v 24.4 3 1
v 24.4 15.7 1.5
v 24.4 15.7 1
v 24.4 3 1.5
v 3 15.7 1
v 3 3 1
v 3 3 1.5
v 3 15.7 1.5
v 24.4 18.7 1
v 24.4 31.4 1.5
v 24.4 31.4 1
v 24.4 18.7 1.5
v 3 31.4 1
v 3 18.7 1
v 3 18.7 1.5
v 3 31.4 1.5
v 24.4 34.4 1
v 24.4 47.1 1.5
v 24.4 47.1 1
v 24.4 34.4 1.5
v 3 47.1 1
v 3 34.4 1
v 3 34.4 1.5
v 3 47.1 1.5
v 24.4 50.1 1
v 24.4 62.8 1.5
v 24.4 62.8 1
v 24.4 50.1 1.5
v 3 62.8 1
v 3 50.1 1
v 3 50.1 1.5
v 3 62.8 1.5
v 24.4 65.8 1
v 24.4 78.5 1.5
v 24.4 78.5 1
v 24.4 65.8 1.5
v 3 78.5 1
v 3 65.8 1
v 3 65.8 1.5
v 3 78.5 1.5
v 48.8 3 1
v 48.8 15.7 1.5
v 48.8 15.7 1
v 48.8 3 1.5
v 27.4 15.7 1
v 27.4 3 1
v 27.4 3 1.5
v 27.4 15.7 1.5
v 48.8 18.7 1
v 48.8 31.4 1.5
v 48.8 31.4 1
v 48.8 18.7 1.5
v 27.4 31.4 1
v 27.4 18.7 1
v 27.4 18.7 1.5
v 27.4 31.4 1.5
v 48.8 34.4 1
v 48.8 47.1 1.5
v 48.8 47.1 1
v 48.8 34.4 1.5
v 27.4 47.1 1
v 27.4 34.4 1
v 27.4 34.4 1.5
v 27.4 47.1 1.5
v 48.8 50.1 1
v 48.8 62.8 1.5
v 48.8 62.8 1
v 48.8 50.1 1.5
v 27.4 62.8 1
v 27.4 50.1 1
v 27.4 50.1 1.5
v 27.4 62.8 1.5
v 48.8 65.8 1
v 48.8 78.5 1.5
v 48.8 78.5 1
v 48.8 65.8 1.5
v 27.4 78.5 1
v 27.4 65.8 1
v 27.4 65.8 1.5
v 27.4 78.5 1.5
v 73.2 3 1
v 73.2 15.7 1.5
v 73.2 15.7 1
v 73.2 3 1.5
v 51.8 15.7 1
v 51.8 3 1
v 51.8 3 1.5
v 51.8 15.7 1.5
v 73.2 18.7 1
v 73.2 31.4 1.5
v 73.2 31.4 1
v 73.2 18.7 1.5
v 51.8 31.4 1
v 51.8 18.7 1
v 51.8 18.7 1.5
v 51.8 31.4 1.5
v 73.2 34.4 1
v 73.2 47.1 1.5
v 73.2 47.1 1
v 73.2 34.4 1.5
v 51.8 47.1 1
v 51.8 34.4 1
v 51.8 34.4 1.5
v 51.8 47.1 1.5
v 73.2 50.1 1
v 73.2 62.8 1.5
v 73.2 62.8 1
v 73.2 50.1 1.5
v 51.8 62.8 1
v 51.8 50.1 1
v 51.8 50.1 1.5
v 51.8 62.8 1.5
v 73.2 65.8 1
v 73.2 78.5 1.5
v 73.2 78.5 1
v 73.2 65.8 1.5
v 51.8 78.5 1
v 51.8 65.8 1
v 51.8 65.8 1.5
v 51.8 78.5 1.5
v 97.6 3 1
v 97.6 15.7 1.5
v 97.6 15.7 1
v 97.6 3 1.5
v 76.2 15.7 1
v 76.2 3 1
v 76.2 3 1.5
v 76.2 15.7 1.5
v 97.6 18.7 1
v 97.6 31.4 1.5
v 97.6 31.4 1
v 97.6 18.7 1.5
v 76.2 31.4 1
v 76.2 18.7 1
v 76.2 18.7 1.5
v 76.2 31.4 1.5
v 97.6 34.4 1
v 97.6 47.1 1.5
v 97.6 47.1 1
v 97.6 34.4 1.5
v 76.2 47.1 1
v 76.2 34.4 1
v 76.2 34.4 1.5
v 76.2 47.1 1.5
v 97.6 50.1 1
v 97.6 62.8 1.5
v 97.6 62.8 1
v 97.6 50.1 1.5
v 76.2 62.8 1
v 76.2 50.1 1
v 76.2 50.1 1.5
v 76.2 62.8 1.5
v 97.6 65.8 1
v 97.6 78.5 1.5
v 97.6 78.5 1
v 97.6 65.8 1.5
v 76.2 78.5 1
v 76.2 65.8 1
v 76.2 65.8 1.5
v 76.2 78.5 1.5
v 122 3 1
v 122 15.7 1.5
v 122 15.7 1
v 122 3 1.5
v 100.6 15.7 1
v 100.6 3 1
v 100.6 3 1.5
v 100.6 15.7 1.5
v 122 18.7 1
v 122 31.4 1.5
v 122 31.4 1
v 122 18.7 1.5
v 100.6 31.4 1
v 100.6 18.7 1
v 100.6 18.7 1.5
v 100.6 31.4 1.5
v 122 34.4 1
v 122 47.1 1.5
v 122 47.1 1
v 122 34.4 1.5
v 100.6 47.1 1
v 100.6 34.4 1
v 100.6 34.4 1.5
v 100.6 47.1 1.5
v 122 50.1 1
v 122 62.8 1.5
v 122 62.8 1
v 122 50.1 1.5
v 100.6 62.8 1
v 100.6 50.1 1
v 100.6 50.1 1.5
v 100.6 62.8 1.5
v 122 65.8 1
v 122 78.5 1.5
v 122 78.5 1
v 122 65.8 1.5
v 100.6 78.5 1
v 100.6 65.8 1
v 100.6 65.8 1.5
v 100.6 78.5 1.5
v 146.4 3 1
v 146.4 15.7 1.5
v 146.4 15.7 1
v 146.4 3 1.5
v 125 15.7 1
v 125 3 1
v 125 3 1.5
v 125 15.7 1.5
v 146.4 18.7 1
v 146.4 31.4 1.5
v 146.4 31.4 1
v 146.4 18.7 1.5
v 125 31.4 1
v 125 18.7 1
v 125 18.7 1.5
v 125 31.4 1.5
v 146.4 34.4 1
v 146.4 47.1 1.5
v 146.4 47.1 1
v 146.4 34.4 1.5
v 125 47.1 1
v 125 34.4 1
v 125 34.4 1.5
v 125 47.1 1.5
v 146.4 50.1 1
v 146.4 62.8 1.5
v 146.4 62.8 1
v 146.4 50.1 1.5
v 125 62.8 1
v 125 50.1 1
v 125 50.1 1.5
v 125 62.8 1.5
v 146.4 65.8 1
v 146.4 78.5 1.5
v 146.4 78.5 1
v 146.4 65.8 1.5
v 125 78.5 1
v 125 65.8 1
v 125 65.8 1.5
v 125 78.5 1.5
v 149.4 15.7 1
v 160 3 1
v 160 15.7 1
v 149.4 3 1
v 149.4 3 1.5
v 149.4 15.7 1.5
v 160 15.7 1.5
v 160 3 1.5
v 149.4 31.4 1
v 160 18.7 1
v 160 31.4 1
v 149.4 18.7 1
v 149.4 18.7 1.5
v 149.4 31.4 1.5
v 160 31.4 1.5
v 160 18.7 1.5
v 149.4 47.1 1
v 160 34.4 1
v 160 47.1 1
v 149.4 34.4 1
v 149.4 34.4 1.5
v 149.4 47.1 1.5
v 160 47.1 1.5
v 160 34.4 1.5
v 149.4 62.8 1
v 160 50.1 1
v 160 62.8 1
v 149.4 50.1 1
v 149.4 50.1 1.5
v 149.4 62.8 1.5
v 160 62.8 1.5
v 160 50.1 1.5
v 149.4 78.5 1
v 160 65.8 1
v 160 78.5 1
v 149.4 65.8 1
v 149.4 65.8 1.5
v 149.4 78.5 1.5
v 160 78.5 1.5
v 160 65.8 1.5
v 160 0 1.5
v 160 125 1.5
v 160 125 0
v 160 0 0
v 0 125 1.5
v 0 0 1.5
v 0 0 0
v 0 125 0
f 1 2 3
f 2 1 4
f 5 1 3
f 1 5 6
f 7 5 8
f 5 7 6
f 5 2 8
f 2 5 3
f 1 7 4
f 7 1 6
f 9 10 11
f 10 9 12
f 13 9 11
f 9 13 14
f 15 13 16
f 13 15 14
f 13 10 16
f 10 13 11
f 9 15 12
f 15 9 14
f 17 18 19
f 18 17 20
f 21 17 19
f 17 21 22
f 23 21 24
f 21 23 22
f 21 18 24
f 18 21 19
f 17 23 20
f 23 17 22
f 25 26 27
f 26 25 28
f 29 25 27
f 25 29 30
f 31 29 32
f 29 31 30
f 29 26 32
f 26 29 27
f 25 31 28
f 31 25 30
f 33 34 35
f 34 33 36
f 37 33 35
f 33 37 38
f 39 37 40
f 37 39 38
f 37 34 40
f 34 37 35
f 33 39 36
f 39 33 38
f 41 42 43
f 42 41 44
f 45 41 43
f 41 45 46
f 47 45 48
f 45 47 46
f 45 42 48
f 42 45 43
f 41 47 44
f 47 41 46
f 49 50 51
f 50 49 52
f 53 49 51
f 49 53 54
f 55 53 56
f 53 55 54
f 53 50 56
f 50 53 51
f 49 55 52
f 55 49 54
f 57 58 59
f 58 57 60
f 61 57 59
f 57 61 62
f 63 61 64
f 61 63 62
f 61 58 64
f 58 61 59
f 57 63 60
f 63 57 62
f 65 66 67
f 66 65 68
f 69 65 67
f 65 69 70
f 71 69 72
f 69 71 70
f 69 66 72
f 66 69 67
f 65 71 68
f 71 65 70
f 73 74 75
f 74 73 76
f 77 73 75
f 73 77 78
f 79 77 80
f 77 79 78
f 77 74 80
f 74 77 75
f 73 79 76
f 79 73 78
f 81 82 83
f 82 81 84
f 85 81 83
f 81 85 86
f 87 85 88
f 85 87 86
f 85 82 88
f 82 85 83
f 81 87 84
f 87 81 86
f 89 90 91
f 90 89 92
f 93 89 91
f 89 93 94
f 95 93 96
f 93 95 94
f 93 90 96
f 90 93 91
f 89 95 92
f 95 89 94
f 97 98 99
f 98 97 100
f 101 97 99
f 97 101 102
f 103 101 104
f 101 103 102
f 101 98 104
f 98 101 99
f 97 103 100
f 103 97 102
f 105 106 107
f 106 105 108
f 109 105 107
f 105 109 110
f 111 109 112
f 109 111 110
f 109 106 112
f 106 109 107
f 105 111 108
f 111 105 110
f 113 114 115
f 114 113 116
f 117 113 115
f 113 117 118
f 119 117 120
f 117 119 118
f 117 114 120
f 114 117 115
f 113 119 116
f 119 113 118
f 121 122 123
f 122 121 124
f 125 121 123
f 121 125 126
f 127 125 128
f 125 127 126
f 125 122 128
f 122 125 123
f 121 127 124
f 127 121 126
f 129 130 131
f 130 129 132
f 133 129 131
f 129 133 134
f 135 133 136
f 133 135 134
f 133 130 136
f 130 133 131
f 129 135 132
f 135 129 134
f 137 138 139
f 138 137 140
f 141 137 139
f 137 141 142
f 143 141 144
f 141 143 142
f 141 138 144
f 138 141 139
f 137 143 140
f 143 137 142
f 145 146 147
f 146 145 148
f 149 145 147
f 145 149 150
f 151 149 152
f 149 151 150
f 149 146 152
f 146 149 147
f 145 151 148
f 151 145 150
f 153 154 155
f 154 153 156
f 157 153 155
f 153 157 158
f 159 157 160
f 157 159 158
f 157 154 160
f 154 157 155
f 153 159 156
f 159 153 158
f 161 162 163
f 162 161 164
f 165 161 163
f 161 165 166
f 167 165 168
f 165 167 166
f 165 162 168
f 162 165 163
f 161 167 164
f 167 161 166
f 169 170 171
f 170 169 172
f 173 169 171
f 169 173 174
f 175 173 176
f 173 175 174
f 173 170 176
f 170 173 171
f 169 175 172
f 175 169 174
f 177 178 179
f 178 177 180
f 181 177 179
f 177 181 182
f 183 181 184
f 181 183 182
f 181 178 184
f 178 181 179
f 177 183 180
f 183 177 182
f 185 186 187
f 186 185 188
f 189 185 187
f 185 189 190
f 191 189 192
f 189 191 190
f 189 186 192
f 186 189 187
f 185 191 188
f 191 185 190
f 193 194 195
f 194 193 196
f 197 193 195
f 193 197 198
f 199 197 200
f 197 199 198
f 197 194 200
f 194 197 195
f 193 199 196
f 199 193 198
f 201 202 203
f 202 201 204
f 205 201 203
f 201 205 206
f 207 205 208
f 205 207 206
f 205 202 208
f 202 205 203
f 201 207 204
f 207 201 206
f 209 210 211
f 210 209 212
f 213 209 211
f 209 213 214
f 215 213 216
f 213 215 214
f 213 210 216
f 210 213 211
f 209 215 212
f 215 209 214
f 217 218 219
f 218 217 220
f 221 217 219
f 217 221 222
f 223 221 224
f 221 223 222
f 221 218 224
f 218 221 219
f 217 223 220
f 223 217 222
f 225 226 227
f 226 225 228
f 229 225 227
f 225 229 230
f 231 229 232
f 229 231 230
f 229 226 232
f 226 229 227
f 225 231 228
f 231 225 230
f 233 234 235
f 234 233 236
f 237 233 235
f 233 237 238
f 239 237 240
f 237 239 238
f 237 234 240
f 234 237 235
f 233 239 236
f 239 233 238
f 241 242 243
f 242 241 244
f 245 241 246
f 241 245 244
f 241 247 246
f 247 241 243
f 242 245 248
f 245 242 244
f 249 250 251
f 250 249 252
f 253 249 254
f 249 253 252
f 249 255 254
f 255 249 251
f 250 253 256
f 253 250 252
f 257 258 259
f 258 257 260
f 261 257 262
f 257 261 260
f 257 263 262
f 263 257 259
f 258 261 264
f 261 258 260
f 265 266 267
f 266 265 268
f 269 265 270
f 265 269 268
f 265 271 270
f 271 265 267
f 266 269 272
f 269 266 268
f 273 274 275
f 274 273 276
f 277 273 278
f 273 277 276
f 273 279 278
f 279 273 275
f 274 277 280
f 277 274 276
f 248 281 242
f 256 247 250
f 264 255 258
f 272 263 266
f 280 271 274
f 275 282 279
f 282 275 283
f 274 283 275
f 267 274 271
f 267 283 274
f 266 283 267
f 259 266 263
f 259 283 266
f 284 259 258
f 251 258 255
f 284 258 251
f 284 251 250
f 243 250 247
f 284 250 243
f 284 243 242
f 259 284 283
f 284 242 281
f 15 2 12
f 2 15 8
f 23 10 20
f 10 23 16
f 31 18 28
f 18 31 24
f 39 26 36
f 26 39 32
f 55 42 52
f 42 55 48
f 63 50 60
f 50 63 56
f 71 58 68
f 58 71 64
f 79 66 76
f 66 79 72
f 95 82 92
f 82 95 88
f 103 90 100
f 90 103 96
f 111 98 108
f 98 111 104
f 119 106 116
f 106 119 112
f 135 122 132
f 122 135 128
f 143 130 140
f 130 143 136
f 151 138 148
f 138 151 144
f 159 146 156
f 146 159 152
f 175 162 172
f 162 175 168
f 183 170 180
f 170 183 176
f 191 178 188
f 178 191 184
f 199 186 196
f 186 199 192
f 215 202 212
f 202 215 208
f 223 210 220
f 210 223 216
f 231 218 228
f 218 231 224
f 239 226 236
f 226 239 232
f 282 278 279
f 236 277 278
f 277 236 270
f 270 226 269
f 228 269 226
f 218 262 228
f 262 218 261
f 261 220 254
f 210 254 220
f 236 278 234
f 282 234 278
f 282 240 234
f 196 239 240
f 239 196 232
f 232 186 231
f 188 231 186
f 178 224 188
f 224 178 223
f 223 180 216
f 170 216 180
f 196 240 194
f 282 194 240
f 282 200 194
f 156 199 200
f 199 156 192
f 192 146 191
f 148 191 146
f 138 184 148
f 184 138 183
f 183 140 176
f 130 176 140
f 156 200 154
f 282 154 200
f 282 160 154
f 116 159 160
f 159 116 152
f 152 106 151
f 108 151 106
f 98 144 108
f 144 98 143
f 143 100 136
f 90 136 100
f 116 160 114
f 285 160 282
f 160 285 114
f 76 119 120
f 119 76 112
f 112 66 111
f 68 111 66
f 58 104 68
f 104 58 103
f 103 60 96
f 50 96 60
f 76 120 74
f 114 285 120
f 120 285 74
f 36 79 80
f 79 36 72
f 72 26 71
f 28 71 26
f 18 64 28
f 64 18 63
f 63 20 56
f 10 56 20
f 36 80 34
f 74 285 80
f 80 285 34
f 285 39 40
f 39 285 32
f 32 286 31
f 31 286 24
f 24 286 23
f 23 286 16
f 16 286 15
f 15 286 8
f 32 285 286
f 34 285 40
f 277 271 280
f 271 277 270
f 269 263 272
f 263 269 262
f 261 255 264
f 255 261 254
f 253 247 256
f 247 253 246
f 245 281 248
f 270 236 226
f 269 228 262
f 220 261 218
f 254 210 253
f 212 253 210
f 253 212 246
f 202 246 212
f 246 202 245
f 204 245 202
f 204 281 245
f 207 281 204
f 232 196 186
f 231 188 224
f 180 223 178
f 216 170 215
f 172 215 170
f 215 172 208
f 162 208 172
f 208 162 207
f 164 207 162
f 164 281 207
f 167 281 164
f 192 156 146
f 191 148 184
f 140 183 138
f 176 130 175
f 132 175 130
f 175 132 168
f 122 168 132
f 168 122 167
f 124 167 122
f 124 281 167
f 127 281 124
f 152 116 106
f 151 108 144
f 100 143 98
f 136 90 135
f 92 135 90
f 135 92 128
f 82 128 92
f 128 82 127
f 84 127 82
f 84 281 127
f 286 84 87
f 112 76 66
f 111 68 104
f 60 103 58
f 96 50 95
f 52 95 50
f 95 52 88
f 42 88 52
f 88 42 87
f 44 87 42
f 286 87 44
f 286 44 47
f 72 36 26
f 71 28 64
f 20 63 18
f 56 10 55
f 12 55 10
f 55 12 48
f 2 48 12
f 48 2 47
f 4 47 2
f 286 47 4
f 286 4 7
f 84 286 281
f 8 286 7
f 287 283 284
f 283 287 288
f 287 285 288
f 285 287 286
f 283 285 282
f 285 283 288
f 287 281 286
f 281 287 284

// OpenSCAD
VENT_WIDTH = 125;
VENT_LENGTH = 320;

PART_HEIGHT = 1.5;
PART_COUNT = 2;

part_length = VENT_LENGTH / PART_COUNT;

LENGTH_SEGMENTS = 10;
WIDTH_SEGMENTS = 5;
SEGMENT_SEPERATOR_SIZE = 3;

module segments() {
    segment_length = (part_length - ((LENGTH_SEGMENTS + 1) * SEGMENT_SEPERATOR_SIZE)) / LENGTH_SEGMENTS;
    segment_width = (VENT_WIDTH - ((WIDTH_SEGMENTS + 1) * SEGMENT_SEPERATOR_SIZE)) / WIDTH_SEGMENTS;
    segment_height = PART_HEIGHT + 2;
    
    for (i = [1 : LENGTH_SEGMENTS]) {
        for (j = [1 : WIDTH_SEGMENTS]) {
            x_offset = SEGMENT_SEPERATOR_SIZE * i + (segment_width * (i - 1));
            y_offset = SEGMENT_SEPERATOR_SIZE * j + (segment_length * (j - 1));
            
            translate([x_offset, y_offset, 1])
            cube([
                segment_width,
                segment_length,
                segment_height
            ]);
        }
    }
}

difference() {
    cube([
        part_length,
        VENT_WIDTH,
        PART_HEIGHT
    ]);
    segments();
}
